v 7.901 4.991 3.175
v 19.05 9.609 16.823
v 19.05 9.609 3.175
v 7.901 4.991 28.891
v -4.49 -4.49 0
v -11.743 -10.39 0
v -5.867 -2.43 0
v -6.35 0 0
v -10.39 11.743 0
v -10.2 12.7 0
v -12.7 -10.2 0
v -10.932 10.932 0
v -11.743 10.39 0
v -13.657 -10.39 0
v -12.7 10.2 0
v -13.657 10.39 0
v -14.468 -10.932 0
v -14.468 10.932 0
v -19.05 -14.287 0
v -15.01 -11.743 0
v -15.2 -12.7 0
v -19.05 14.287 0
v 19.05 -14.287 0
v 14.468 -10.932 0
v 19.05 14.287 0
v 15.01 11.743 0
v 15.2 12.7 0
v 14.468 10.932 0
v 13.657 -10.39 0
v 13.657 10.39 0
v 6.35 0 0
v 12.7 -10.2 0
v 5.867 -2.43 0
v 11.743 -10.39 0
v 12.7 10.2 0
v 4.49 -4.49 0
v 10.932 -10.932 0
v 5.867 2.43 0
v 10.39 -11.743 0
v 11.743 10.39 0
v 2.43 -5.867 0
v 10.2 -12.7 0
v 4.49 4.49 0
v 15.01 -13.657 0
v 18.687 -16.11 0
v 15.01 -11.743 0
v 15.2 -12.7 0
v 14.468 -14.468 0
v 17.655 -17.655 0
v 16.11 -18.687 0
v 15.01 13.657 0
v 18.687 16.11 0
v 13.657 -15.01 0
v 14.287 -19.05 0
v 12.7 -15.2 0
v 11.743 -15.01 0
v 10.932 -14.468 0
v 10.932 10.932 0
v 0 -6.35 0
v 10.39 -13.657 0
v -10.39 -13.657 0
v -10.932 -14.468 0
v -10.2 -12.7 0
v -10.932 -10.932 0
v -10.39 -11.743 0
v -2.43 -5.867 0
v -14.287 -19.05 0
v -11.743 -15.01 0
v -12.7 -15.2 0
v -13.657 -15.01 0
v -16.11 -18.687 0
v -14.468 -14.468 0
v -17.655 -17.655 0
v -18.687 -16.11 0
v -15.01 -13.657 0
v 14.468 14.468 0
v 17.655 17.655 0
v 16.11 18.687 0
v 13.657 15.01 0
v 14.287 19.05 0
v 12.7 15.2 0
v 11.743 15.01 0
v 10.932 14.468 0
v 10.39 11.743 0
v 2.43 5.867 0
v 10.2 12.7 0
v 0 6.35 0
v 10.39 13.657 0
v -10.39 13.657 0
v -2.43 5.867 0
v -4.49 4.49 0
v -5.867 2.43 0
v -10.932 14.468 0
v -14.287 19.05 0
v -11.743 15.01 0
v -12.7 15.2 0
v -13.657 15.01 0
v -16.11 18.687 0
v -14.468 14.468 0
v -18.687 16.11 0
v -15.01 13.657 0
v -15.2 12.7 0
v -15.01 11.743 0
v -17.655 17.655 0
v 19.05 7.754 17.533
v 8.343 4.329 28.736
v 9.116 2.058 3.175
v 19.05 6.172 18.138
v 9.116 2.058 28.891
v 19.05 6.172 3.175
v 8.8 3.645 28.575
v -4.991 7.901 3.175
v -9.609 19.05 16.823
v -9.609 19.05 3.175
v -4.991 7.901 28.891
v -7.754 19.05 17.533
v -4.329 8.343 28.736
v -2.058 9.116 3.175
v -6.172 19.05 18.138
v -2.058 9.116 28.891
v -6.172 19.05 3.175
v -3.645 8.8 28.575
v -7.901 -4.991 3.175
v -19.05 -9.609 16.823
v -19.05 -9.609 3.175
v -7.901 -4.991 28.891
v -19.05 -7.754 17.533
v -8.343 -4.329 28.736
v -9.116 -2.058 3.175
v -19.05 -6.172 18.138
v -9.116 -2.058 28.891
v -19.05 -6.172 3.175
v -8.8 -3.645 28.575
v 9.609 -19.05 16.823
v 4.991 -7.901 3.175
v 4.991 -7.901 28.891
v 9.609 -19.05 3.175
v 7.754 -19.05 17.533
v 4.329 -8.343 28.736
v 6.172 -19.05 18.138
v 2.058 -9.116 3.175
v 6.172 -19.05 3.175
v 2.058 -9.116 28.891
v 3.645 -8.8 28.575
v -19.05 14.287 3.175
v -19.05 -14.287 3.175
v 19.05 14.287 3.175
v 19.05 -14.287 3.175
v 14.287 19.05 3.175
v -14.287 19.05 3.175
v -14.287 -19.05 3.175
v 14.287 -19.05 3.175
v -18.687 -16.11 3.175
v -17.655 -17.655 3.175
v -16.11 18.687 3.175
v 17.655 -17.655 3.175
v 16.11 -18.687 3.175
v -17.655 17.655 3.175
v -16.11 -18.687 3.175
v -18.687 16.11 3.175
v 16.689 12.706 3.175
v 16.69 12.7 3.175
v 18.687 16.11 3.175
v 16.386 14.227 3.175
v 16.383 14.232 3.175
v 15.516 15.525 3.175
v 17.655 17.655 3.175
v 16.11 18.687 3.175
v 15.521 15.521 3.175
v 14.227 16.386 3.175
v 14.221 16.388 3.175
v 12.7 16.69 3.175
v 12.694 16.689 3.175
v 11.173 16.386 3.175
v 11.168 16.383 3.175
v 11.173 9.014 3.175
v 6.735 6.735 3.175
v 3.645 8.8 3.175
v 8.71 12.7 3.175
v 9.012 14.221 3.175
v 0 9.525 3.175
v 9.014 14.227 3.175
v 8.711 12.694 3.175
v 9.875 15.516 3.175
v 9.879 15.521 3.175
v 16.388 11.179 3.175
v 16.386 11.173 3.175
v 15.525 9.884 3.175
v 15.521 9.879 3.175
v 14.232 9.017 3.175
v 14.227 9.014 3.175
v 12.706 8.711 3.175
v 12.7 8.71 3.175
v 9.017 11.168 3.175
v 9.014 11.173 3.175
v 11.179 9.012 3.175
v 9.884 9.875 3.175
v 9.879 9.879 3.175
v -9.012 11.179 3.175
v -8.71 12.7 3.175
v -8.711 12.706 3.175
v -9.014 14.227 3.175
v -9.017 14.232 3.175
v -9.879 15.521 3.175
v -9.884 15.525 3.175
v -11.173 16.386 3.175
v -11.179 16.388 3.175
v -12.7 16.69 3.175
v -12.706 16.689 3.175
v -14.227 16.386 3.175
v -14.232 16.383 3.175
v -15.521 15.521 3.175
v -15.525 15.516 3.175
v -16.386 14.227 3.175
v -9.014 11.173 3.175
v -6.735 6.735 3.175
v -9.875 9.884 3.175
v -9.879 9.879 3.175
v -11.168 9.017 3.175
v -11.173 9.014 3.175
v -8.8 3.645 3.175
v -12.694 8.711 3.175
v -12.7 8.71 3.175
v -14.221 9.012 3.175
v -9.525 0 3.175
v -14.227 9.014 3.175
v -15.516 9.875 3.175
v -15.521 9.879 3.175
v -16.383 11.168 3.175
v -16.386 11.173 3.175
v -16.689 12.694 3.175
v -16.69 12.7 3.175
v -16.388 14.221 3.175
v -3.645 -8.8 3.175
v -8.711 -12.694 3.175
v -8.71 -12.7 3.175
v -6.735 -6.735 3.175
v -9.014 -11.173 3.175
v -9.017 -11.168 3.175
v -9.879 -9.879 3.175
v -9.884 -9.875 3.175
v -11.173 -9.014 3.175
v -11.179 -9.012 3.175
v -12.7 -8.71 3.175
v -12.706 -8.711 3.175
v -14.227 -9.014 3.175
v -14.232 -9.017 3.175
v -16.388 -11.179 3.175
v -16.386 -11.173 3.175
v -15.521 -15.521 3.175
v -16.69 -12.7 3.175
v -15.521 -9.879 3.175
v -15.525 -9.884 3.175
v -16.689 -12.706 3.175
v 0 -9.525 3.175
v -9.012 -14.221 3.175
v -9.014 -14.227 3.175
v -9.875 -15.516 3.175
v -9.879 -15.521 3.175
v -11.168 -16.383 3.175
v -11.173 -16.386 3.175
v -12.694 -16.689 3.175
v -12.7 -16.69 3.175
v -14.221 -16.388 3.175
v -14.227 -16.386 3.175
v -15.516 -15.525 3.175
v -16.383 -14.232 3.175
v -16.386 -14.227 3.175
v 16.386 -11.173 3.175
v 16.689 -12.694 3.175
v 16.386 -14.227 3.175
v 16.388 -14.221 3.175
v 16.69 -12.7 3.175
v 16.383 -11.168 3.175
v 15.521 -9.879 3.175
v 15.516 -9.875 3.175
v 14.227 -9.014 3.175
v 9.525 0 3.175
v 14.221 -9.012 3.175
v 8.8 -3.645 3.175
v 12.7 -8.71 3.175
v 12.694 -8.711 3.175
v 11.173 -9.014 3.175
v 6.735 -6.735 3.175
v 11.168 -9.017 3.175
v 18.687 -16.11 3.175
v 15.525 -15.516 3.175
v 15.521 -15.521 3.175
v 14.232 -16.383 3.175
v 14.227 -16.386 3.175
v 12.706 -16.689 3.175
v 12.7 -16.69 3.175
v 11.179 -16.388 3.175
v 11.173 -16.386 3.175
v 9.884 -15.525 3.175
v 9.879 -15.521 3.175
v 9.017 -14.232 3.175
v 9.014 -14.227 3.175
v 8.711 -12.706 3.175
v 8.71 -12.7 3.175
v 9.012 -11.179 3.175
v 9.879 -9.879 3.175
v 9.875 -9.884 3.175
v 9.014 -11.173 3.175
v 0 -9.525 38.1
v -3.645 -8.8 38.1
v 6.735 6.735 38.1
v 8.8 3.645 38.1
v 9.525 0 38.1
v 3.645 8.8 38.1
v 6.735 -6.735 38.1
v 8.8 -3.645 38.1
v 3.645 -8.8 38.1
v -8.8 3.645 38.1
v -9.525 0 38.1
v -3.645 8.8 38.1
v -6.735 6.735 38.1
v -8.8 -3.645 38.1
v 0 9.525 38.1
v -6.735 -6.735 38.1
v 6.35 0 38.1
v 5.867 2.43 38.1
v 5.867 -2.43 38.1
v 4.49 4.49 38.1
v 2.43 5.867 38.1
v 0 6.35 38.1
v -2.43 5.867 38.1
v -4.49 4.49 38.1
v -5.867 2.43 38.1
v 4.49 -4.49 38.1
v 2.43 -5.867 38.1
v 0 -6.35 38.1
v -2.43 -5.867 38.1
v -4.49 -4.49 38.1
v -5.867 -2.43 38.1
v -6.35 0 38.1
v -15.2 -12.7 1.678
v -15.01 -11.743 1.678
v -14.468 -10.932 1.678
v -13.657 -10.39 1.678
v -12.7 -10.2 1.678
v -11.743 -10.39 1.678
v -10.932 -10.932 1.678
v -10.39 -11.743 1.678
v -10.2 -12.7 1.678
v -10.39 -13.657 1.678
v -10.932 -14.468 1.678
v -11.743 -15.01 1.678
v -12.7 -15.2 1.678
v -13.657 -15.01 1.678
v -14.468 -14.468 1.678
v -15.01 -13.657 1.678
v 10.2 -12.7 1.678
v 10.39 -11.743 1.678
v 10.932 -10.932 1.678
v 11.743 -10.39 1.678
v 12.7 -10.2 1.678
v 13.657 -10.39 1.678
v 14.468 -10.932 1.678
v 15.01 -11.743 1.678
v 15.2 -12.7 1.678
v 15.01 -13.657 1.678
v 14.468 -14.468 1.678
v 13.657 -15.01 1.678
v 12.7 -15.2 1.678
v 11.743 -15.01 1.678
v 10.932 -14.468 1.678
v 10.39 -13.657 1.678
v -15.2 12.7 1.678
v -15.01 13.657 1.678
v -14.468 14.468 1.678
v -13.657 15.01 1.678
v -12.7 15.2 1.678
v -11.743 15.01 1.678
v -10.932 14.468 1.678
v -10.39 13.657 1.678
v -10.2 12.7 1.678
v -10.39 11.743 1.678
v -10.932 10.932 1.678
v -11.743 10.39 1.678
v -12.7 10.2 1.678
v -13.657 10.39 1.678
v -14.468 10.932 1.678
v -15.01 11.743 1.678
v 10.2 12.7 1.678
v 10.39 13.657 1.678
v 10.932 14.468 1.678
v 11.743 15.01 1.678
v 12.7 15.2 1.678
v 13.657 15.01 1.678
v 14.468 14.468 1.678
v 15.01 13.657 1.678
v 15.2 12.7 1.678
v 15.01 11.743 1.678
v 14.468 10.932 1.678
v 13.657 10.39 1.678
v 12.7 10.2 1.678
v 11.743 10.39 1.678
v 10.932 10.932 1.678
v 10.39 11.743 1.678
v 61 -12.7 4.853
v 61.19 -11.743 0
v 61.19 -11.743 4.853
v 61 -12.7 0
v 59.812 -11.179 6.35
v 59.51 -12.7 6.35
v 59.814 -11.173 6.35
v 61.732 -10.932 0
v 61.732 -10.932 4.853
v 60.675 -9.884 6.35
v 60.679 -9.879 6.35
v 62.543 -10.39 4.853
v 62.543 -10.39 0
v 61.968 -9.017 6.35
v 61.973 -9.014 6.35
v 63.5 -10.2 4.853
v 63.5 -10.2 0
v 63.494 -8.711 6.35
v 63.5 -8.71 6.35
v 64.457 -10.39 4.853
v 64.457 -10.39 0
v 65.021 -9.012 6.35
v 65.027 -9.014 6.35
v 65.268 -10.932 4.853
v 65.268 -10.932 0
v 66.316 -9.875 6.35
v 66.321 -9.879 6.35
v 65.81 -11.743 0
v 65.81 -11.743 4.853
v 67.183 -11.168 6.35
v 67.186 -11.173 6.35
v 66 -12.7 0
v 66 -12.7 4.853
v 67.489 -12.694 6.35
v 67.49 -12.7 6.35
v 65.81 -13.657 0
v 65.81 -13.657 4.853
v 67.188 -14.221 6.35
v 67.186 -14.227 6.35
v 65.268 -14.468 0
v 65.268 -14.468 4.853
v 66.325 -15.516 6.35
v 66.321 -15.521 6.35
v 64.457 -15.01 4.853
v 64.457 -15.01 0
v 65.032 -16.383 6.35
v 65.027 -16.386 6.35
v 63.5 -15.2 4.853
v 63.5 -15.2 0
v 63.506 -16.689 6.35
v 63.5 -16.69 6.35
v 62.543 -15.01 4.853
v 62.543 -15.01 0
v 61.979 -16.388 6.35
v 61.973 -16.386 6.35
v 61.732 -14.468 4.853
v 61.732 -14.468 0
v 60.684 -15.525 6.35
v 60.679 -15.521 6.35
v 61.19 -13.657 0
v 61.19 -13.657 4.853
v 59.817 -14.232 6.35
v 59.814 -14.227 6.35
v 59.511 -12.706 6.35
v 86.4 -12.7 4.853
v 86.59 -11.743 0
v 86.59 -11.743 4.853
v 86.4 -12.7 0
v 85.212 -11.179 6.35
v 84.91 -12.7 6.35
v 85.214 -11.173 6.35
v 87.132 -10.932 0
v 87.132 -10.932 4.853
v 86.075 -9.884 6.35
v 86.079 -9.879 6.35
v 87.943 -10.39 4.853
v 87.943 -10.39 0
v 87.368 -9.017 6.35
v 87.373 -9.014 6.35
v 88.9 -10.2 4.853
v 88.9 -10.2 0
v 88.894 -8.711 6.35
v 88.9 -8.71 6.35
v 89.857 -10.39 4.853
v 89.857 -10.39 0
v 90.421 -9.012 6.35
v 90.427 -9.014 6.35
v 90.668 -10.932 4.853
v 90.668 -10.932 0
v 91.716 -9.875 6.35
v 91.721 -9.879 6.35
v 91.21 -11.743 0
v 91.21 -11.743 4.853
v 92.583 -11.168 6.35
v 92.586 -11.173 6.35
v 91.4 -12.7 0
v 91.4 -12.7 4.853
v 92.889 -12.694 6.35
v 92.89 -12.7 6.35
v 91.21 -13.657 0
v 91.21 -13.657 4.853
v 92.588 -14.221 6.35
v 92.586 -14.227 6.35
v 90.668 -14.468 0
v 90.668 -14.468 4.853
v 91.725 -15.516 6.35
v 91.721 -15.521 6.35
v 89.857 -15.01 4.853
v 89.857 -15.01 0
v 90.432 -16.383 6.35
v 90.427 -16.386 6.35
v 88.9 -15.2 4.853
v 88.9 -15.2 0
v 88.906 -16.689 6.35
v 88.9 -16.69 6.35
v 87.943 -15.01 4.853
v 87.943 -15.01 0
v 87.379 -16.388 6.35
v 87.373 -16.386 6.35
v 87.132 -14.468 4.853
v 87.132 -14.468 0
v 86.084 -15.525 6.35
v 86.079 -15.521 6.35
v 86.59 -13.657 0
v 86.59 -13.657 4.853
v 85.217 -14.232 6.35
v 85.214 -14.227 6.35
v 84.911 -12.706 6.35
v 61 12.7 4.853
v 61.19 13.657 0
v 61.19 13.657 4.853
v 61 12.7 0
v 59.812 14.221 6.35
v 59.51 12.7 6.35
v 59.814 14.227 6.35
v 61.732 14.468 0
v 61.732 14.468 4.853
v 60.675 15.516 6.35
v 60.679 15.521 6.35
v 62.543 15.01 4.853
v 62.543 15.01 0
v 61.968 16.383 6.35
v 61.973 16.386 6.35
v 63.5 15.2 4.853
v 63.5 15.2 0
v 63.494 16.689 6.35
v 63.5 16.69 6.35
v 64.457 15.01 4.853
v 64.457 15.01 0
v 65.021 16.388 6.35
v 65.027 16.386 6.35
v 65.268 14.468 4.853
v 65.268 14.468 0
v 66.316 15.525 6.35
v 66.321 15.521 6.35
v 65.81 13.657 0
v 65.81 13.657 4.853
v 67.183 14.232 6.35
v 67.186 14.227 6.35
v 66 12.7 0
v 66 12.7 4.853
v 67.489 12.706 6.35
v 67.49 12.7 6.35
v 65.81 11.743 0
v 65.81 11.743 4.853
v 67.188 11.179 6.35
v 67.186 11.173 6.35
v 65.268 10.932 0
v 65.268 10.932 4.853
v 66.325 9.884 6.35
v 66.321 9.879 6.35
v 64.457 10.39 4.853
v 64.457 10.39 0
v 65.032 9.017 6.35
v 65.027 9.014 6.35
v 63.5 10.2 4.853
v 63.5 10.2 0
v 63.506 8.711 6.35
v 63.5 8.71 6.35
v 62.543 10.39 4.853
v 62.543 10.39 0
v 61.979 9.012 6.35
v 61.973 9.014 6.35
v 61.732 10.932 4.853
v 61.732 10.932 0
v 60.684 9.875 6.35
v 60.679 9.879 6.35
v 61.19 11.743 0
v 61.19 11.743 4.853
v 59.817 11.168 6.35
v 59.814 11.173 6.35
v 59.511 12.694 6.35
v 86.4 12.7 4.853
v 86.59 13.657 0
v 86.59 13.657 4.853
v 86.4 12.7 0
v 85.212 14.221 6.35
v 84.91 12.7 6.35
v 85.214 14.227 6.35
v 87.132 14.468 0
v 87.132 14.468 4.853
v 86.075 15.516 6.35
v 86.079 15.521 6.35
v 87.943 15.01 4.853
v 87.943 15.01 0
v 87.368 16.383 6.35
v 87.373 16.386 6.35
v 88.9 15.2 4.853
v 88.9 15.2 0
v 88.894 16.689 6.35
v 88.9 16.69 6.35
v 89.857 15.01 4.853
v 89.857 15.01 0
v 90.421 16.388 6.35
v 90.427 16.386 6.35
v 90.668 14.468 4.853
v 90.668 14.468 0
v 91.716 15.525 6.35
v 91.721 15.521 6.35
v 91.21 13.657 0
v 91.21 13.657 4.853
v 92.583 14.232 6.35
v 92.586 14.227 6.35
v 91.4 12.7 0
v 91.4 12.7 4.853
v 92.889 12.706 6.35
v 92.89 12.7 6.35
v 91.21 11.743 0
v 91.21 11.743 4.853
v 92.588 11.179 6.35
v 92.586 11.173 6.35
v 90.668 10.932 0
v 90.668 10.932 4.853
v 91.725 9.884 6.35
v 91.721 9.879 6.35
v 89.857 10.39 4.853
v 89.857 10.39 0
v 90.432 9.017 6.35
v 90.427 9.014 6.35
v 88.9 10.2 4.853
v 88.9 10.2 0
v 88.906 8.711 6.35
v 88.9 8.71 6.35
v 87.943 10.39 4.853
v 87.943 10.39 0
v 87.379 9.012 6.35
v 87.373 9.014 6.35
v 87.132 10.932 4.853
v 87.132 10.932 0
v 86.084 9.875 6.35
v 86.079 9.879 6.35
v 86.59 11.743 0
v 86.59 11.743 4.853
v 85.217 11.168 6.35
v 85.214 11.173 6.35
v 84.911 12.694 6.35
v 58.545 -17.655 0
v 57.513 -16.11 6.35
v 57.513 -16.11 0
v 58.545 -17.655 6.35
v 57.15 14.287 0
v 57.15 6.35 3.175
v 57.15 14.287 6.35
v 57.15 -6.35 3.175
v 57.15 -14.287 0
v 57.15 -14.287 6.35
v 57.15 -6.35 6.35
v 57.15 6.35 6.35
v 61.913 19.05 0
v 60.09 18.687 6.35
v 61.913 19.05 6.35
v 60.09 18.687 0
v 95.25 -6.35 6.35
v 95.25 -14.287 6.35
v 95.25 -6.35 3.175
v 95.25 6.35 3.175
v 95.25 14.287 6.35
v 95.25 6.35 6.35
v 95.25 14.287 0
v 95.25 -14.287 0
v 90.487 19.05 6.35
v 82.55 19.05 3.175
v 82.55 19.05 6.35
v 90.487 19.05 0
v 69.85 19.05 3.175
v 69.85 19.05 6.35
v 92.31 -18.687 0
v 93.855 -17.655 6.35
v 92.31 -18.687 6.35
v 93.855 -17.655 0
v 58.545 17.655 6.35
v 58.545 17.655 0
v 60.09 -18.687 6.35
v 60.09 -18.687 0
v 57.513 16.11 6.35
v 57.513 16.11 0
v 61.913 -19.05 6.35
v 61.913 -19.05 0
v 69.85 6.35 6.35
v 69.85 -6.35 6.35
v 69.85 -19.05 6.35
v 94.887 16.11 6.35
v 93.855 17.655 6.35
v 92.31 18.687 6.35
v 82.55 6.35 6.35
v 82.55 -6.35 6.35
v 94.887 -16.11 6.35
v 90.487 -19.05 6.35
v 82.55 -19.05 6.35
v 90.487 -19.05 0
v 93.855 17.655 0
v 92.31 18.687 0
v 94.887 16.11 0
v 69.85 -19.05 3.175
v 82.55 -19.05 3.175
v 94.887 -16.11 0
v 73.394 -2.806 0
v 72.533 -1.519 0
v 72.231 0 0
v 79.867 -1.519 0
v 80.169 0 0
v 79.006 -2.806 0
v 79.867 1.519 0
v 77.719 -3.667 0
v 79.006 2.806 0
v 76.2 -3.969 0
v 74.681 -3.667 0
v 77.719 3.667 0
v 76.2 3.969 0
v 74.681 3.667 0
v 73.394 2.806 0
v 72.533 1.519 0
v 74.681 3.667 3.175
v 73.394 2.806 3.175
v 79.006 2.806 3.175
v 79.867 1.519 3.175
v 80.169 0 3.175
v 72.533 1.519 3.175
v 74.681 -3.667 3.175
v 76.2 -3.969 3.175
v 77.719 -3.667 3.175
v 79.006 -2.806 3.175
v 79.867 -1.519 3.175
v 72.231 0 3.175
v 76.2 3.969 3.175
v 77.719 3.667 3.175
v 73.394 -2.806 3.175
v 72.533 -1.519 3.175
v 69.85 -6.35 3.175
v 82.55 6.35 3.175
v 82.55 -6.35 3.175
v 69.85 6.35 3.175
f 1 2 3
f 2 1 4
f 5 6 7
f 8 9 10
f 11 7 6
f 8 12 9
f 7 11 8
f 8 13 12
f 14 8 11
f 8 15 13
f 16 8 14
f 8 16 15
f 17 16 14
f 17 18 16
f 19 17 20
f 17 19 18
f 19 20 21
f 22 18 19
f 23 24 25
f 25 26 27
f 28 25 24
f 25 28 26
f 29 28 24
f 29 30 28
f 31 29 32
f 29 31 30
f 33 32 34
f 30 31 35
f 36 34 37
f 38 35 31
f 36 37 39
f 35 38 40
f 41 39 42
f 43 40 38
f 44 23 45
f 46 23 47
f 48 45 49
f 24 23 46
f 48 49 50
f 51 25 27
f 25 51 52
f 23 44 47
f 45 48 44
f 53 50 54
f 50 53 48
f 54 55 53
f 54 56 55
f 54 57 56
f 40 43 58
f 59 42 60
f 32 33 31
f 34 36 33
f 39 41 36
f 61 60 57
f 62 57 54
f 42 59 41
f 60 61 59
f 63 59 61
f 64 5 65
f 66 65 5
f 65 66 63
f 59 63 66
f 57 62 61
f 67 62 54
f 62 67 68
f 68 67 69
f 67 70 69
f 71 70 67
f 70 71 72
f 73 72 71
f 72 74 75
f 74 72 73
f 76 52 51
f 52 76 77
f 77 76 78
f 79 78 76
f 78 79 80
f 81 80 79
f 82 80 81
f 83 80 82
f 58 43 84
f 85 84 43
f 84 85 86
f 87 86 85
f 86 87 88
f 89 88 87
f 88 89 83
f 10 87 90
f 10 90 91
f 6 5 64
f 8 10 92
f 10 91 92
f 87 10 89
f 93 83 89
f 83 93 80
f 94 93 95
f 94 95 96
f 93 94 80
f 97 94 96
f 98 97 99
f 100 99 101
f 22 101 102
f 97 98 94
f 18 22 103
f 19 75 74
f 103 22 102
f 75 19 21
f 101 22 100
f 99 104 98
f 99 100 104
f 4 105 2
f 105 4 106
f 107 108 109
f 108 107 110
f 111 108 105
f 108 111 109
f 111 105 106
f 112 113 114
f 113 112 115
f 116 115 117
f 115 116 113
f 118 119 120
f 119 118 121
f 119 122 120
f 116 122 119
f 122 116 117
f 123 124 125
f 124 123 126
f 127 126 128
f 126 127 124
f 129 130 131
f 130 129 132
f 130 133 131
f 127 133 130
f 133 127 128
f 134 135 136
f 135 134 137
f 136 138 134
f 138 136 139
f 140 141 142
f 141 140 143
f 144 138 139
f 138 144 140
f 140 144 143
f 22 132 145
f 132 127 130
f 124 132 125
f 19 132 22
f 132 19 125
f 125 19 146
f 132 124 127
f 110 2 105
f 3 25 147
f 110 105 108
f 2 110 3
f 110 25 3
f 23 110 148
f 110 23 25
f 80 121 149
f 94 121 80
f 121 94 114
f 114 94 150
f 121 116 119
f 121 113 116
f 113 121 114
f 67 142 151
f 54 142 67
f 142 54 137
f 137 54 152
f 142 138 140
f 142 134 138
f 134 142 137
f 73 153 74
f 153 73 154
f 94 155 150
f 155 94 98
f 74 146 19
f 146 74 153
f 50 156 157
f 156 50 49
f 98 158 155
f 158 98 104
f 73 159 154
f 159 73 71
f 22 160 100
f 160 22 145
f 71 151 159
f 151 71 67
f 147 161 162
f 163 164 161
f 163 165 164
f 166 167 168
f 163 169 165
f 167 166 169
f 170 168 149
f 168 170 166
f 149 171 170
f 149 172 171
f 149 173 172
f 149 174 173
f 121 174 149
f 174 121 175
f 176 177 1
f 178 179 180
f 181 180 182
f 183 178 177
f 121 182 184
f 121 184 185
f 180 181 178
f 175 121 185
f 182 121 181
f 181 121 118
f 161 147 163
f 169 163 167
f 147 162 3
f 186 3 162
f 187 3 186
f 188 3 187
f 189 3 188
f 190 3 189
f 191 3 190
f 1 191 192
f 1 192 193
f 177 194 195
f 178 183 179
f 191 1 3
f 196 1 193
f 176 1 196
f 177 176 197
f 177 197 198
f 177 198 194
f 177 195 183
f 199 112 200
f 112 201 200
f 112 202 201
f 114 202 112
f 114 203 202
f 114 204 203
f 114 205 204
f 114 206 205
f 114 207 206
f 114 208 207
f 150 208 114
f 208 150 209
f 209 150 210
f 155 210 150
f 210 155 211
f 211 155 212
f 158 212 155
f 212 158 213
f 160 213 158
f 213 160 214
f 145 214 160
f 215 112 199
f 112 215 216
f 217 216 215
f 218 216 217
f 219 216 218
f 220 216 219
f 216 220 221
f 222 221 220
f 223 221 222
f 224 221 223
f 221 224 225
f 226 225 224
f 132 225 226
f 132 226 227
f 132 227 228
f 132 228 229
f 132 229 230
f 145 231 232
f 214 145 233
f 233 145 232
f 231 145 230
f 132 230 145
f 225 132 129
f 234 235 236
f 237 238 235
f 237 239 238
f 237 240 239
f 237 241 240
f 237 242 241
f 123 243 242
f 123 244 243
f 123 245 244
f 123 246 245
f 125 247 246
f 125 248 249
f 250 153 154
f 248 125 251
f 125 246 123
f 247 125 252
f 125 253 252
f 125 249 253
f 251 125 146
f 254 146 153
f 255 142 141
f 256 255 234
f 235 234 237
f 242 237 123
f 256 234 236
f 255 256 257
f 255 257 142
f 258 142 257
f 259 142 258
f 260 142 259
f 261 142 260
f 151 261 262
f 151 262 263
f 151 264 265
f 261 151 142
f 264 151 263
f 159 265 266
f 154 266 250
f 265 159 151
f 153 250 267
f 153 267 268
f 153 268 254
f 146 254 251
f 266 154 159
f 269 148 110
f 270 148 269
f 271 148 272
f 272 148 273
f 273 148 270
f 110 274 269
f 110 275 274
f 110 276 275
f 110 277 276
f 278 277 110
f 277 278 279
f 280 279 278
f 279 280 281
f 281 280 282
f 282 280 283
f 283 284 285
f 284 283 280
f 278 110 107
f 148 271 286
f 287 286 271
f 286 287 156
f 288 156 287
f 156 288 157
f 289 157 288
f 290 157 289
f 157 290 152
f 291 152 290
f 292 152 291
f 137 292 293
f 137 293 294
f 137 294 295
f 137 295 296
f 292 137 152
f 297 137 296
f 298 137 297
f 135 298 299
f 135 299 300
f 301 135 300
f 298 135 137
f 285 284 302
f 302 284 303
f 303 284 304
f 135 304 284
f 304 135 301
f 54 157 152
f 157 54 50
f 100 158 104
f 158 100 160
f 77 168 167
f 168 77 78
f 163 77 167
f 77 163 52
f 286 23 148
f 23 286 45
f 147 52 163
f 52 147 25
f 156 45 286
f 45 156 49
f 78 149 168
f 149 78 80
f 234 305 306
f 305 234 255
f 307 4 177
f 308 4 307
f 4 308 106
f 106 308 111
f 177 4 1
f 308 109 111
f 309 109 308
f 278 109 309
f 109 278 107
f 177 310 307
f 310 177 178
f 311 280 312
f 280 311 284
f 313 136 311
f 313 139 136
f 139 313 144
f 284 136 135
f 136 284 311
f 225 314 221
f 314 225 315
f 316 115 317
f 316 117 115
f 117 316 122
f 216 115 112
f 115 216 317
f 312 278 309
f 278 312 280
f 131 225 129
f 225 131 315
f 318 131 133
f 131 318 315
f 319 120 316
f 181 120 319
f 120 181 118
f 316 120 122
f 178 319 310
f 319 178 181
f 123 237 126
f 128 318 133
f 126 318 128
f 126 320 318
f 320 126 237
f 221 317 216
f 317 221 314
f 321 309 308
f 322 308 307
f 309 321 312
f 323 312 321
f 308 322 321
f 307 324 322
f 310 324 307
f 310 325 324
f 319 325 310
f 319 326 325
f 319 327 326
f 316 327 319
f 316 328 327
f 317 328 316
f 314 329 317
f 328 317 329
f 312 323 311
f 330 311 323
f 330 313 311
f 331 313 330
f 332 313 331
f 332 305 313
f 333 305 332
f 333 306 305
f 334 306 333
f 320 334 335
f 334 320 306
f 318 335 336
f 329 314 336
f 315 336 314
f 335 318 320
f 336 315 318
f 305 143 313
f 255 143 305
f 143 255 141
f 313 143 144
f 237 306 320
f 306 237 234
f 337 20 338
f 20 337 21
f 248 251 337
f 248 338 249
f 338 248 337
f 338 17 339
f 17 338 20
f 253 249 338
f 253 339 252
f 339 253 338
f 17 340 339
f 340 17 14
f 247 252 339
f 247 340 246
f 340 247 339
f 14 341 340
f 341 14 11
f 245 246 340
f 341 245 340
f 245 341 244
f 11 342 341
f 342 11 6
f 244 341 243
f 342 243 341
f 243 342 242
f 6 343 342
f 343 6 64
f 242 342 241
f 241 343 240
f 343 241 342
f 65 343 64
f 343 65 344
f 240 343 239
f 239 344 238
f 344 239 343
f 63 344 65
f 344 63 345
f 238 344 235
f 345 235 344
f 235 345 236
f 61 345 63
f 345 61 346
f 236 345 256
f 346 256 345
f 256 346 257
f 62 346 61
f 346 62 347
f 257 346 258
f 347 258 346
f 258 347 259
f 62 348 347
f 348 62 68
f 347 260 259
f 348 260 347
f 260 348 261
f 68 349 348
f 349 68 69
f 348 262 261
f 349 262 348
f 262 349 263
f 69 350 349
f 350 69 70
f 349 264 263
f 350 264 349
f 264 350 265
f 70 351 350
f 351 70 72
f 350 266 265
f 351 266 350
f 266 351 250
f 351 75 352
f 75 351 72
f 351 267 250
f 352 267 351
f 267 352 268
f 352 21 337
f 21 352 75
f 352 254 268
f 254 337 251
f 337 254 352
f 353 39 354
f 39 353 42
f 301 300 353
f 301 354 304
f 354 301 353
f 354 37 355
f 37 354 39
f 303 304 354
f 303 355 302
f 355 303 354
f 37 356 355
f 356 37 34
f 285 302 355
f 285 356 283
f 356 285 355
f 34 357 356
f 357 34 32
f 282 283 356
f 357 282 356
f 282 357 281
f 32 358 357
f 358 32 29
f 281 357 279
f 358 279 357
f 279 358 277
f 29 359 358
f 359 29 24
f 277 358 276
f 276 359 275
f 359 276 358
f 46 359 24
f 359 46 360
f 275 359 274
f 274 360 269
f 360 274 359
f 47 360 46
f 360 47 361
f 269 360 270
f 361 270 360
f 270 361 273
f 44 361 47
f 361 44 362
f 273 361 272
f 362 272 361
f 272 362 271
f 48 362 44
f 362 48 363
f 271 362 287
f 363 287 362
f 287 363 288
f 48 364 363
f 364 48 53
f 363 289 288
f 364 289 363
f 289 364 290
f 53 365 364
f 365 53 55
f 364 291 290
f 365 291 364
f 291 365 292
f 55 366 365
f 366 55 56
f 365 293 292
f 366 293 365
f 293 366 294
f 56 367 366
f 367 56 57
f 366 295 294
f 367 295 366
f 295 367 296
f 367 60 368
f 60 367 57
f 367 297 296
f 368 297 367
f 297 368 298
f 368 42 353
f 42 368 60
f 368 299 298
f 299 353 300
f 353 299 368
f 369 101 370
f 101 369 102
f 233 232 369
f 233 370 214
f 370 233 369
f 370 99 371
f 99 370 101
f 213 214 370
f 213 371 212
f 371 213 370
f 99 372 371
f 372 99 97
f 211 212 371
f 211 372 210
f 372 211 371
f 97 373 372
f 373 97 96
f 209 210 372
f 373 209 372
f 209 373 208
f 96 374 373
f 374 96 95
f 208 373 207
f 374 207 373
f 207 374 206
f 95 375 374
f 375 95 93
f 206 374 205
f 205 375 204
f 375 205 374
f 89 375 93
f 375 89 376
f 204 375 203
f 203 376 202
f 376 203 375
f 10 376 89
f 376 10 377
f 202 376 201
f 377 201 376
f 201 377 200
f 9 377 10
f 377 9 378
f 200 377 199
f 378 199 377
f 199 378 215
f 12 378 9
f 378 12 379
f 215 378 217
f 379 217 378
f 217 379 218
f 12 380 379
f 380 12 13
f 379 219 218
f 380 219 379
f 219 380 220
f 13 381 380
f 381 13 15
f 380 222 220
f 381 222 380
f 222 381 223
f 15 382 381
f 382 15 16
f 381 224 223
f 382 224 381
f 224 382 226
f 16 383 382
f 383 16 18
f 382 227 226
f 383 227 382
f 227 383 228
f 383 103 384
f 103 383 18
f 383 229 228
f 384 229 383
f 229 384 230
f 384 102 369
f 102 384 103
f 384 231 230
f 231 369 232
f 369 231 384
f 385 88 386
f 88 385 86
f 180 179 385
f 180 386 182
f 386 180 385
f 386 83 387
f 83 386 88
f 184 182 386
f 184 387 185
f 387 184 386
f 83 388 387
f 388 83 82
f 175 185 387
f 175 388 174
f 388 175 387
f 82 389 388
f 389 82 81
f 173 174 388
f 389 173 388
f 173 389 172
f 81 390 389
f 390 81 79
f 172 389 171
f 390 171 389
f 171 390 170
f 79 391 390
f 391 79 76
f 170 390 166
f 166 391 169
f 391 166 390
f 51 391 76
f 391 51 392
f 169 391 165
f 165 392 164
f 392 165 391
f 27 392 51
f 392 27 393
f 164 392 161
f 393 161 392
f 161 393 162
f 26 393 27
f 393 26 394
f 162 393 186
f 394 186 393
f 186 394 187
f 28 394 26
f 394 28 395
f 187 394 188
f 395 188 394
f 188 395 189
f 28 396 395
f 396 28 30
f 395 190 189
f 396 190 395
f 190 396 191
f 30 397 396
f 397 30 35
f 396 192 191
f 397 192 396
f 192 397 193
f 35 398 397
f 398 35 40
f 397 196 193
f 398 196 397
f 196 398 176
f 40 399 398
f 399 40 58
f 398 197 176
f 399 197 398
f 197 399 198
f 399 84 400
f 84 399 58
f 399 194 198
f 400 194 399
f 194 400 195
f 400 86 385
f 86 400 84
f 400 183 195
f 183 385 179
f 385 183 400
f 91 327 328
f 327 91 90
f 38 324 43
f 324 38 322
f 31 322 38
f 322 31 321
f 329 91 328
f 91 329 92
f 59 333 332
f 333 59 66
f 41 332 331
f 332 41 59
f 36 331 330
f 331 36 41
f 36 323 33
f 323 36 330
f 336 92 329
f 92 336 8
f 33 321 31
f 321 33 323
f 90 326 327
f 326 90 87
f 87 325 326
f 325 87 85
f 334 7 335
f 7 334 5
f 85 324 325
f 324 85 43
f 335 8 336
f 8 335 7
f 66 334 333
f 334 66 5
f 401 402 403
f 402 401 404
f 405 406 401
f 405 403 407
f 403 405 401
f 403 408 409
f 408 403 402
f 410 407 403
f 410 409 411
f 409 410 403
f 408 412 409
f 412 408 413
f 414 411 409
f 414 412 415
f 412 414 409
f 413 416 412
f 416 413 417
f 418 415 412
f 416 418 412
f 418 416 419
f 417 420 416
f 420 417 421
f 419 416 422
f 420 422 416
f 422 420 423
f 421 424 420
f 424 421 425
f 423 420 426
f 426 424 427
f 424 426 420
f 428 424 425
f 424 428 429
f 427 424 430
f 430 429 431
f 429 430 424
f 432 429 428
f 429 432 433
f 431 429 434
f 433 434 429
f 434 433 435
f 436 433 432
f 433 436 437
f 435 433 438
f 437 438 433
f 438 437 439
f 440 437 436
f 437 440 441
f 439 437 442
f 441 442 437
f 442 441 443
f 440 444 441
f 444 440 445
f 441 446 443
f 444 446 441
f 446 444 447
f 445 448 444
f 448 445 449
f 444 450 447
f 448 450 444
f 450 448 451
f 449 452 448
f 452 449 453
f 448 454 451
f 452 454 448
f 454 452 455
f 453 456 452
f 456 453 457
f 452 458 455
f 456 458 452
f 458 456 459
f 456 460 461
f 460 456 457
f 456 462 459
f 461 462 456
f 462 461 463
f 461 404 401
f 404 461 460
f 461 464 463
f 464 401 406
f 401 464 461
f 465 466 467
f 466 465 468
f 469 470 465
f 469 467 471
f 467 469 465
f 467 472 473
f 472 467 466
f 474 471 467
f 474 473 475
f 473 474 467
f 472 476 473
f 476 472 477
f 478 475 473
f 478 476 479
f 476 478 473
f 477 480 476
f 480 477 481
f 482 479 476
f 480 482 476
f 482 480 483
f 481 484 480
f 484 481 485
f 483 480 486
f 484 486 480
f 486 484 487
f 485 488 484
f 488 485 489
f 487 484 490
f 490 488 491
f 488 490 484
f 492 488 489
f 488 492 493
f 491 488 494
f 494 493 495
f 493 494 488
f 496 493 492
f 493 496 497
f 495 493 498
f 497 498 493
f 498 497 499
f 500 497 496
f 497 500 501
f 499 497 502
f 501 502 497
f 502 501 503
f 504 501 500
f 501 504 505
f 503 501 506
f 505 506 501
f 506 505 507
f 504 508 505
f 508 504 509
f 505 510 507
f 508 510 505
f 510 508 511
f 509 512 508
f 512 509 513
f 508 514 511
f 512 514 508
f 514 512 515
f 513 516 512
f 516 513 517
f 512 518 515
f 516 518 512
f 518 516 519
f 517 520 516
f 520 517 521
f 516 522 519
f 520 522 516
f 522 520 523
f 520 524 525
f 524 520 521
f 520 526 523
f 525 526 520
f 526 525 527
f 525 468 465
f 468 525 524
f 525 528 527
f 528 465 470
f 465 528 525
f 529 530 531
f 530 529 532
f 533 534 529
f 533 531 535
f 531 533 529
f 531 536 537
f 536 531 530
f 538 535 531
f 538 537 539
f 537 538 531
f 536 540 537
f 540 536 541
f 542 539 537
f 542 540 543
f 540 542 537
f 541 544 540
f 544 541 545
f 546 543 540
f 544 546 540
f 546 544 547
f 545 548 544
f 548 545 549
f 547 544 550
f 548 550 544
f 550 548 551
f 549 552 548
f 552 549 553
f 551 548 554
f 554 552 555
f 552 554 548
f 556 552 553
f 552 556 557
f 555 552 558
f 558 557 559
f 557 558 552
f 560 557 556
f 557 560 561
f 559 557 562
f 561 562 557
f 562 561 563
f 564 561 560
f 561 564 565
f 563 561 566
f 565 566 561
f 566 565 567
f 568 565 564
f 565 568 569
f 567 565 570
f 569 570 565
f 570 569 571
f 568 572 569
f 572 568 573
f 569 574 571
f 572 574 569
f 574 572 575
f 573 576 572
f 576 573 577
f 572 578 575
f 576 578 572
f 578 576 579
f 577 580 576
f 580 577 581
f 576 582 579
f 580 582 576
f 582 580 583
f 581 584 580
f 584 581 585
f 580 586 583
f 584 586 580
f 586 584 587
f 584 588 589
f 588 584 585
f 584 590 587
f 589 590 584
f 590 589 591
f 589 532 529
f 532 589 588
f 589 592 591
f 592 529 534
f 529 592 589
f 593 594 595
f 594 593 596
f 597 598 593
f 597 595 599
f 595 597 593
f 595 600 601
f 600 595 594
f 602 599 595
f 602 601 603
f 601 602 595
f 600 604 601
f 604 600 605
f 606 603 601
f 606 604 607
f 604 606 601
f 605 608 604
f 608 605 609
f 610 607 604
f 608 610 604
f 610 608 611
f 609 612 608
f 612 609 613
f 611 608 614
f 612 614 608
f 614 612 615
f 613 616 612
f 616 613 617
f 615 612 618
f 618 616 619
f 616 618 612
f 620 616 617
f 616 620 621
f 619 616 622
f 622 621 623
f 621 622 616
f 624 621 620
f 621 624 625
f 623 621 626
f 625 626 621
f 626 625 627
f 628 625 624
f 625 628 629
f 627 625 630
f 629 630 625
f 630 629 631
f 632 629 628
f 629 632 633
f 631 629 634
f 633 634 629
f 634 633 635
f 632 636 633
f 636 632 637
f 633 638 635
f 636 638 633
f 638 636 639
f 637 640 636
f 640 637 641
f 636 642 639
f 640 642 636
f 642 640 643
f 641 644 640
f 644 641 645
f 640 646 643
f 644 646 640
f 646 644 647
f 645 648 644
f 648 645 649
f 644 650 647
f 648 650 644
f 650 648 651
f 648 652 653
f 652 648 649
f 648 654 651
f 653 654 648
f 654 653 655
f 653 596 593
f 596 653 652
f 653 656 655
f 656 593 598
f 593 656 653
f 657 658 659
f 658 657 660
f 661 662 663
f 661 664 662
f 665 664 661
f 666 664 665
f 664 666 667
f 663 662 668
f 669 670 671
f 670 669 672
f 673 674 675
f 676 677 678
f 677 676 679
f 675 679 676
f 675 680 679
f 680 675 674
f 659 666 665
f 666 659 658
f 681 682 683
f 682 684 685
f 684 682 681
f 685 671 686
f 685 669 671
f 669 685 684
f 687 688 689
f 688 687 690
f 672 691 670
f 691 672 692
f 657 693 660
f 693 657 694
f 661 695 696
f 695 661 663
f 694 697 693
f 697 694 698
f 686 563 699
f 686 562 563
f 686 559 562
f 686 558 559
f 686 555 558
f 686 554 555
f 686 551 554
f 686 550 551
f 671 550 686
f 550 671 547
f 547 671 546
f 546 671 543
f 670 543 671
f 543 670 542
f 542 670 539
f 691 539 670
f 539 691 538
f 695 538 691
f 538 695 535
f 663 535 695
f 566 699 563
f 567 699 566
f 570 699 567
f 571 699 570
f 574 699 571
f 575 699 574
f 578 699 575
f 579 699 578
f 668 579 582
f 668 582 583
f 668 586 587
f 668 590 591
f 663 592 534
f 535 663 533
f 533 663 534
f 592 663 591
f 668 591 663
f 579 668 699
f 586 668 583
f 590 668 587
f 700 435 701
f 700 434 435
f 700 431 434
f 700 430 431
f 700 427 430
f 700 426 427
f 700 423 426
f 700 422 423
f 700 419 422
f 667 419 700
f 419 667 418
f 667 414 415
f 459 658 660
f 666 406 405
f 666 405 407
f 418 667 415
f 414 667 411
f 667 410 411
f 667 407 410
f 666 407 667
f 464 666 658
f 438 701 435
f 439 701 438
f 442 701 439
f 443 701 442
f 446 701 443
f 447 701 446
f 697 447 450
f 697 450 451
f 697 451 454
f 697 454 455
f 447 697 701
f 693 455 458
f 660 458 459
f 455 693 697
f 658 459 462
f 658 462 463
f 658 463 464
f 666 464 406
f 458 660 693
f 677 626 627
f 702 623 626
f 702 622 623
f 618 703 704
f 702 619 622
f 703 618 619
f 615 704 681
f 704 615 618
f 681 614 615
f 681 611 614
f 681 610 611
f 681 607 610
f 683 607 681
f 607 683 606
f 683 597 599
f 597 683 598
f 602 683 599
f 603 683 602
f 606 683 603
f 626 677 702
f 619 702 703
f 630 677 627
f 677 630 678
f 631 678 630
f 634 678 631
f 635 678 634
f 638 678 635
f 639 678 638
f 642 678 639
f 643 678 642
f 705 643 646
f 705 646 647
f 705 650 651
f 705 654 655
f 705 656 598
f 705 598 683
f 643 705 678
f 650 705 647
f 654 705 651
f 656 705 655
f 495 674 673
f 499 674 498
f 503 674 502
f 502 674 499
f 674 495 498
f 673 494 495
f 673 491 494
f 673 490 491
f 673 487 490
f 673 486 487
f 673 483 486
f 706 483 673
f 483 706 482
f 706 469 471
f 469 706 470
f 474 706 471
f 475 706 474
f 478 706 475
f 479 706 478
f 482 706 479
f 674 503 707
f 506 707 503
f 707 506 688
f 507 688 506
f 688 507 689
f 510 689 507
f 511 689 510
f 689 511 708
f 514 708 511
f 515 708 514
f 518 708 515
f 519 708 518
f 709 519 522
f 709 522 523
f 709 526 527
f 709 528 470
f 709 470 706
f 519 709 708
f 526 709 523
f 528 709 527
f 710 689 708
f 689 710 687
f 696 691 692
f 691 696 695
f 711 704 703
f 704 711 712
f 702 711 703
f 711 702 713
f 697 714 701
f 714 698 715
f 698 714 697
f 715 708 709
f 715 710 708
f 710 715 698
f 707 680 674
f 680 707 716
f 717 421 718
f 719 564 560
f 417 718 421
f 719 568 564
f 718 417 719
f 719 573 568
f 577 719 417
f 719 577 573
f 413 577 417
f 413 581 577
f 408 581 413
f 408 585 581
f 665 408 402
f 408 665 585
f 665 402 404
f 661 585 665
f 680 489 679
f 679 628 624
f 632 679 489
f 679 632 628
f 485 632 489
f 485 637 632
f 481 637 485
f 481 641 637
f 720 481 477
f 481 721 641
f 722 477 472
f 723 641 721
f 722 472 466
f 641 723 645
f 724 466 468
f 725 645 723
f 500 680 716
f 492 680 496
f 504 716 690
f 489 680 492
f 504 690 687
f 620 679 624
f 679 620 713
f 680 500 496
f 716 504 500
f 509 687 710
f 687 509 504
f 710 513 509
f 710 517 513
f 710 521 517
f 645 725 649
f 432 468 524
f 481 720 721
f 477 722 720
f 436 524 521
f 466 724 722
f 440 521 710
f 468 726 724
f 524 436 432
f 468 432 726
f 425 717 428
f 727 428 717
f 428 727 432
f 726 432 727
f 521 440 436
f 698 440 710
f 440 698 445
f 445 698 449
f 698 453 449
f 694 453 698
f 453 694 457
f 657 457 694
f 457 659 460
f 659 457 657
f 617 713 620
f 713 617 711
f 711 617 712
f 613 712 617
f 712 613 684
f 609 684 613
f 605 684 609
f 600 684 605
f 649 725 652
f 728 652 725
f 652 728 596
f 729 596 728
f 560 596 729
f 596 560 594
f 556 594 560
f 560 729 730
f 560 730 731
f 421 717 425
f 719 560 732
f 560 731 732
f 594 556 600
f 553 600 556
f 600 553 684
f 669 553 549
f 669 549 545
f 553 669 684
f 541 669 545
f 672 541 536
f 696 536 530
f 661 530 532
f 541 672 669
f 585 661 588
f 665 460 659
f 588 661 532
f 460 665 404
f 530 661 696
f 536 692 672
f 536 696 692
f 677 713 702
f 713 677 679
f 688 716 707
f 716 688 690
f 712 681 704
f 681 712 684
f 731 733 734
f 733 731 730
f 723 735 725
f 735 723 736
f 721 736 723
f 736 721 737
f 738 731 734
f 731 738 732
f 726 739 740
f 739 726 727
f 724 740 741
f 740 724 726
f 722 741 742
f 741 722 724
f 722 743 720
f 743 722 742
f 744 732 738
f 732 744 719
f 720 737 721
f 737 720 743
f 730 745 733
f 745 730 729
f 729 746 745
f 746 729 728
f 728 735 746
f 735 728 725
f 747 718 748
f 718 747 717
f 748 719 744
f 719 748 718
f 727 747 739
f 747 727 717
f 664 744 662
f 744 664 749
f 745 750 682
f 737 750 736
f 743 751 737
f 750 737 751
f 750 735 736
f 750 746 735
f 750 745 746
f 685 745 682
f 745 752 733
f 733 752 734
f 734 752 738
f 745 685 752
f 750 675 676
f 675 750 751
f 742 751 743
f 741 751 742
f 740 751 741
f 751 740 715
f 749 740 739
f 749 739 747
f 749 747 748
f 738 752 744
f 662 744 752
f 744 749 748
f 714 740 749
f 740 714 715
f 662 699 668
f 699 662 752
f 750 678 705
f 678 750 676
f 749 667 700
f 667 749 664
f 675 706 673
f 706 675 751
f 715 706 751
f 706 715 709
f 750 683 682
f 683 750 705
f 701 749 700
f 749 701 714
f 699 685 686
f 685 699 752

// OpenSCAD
// file: ../lib/TOGHoleLib-v1.scad
// Library of hole shapes!
// Mostly to accommodate counterbored/countersunk screws.

module tog_holelib_countersunk_hole_2(surface_d, neck_d, head_h, depth, bore_d, overhead_bore_d, overhead_bore_height) {
	rotate_extrude() {
		union() {
			// Bore
			polygon([
				[     0  , -depth],
				[bore_d/2, -depth],
				[bore_d/2, -0.01],
				[     0  , -0.01],
			]);
			// Head and headbore
			polygon([
				[              0  ,               -head_h],
				[         neck_d/2,               -head_h],
				// Try to avoid points exactly at the surface:
				[      surface_d/2,                 0.01 ],
				[overhead_bore_d/2,                 0.01 ],
				[overhead_bore_d/2,  overhead_bore_height],
				[              0  ,  overhead_bore_height],
			]);
		}
	}
}

module tog_holelib_countersunk_hole(surface_d, neck_d, head_h, depth, bore_d=-1, overhead_bore_d=0, overhead_bore_height=1) {
	tog_holelib_countersunk_hole_2(surface_d, neck_d, head_h, depth, bore_d == -1 ? neck_d : bore_d, max(surface_d, overhead_bore_d), overhead_bore_height);
}

// Suitable for #6 flatheads
module tog_holelib_hole1001(depth, overhead_bore_height=1) {
	tog_holelib_countersunk_hole(8, 4, 2, depth, 5, 0, overhead_bore_height);
}

// Suitable for 1/4" flatheads
module tog_holelib_hole1002(depth, overhead_bore_height=1) {
	tog_holelib_countersunk_hole(1/2*inch, 1/4*inch, 1/8*inch, depth, 5/16*inch, 0, overhead_bore_height);
}

// Hole type names:
// 
// THL-1001: Countersunk hole for #6 machine screws or 6x sheet metal screws
// THL-1002: Countersunk hole for 1/4" flathead machine screws

module tog_holelib_hole(type_name, depth=1000, overhead_bore_height=1) {
	if( type_name == "THL-1001" ) {
		tog_holelib_hole1001(depth, overhead_bore_height);
	} else if( type_name == "THL-1002" ) {
		tog_holelib_hole1002(depth, overhead_bore_height);
	} else {
		assert(false, str("Unknown hole type: '", type_name, "'"));
	}
}
// main file
// DrillBitBushingJig-v1.2
// 
// Holds a metal bushing
// (or can itself *be* the bushing, if you don't mind having to routinely re-print it)
// so you can drill straight
//
// Changes:
// v1.1:
// - 1/2" hole grid instead of 3/4"
// - Offset fins to mostly miss the holes
// v1.2:
// - Mounting holes on the 1/2" grid, but only in the corners
// - Add this riser thing which you could bolt under the thing
//   to give all the woodchips somewhere to go

// Grid cell size, used for things expressed in grid units
gc_size = 3.175;
base_size_gc = [12, 12, 1];
base_corner_radius = 4.7625;

fin_thickness = 3.175;
fin_rotation_offset = 22.5;
fin_count = 4;

height = 38.1;
inner_diameter = 12.7;
outer_diameter = 19.05;

// 1/8" = 3.175, 1/4" = 6.35, 3/8" = 9.525
riser_thickness = 6.35;
riser_inner_diameter = 7.9375;

$fn = 16;

include <../lib/TOGHoleLib-v1.scad>

function map(arr, fn) = [for(v=arr) fn(v)];

base_size = map(base_size_gc, function(gc) gc * gc_size);

function tovec2(v) = [v[0], v[1]];

module rounded_square(size, corner_radius, offset=0) {
	hull() for( ym=[-1,1] ) for( xm=[-1,1] ) {
		translate([
			xm*(size[0]/2-corner_radius),
			ym*(size[1]/2-corner_radius),
		]) circle(r=corner_radius+offset);
	}
}
module xy_rounded_cube(size, corner_radius) {
	linear_extrude(size[2], center=true) rounded_square(size, corner_radius);
}

mounting_hole_positions = [for( ym=[-1,1] ) for( xm=[-1,1] ) [xm*12.7, ym*12.7]];

module jig() {
       difference() {
		union() {
			translate([0,0,base_size[2]/2]) xy_rounded_cube(base_size, base_corner_radius);
			
			cylinder(d=outer_diameter, h=height, center=false);
			
			intersection() {
				translate([0,0,50]) xy_rounded_cube([base_size[0], base_size[1], 100], base_corner_radius);
				union() for( r=[0:1:fin_count-1] ) rotate([0,0,fin_rotation_offset+r*360/fin_count]) {
					rotate([90,0,0]) linear_extrude(fin_thickness, center=true) polygon([
						[0, 0],
						[0, height],
						[height, 0],
					]);
				}
			}
		}
		translate([0,0,height/2]) cylinder(d=inner_diameter, h=height*2, center=true);
		// TODO: Make configurable, base on base size
		for( pos=mounting_hole_positions ) {
			translate([pos[0], pos[1], base_size[2]]) tog_holelib_hole("THL-1001", depth=100, overhead_bore_height=100);
		}
	}
}

riser_slot_height = riser_thickness-3.175;

module riser() {
	difference() {
		translate([0,0,riser_thickness/2]) xy_rounded_cube([base_size[0], base_size[1], riser_thickness], base_corner_radius);
		translate([0,0,riser_thickness/2]) cylinder(d=riser_inner_diameter, h=100, center=true);
		translate([0,0,riser_thickness]) cube([base_size[0]*2, 12.7, riser_slot_height*2], center=true);
		translate([0,0,riser_thickness]) cube([12.7, base_size[1]*2, riser_slot_height*2], center=true);
		for( pos=mounting_hole_positions ) {
			translate([pos[0], pos[1], riser_thickness]) tog_holelib_hole("THL-1001", depth=100, overhead_bore_height=100);
		}
	}
}

jig();
translate([base_size[0]*2, 0, 0]) riser();
